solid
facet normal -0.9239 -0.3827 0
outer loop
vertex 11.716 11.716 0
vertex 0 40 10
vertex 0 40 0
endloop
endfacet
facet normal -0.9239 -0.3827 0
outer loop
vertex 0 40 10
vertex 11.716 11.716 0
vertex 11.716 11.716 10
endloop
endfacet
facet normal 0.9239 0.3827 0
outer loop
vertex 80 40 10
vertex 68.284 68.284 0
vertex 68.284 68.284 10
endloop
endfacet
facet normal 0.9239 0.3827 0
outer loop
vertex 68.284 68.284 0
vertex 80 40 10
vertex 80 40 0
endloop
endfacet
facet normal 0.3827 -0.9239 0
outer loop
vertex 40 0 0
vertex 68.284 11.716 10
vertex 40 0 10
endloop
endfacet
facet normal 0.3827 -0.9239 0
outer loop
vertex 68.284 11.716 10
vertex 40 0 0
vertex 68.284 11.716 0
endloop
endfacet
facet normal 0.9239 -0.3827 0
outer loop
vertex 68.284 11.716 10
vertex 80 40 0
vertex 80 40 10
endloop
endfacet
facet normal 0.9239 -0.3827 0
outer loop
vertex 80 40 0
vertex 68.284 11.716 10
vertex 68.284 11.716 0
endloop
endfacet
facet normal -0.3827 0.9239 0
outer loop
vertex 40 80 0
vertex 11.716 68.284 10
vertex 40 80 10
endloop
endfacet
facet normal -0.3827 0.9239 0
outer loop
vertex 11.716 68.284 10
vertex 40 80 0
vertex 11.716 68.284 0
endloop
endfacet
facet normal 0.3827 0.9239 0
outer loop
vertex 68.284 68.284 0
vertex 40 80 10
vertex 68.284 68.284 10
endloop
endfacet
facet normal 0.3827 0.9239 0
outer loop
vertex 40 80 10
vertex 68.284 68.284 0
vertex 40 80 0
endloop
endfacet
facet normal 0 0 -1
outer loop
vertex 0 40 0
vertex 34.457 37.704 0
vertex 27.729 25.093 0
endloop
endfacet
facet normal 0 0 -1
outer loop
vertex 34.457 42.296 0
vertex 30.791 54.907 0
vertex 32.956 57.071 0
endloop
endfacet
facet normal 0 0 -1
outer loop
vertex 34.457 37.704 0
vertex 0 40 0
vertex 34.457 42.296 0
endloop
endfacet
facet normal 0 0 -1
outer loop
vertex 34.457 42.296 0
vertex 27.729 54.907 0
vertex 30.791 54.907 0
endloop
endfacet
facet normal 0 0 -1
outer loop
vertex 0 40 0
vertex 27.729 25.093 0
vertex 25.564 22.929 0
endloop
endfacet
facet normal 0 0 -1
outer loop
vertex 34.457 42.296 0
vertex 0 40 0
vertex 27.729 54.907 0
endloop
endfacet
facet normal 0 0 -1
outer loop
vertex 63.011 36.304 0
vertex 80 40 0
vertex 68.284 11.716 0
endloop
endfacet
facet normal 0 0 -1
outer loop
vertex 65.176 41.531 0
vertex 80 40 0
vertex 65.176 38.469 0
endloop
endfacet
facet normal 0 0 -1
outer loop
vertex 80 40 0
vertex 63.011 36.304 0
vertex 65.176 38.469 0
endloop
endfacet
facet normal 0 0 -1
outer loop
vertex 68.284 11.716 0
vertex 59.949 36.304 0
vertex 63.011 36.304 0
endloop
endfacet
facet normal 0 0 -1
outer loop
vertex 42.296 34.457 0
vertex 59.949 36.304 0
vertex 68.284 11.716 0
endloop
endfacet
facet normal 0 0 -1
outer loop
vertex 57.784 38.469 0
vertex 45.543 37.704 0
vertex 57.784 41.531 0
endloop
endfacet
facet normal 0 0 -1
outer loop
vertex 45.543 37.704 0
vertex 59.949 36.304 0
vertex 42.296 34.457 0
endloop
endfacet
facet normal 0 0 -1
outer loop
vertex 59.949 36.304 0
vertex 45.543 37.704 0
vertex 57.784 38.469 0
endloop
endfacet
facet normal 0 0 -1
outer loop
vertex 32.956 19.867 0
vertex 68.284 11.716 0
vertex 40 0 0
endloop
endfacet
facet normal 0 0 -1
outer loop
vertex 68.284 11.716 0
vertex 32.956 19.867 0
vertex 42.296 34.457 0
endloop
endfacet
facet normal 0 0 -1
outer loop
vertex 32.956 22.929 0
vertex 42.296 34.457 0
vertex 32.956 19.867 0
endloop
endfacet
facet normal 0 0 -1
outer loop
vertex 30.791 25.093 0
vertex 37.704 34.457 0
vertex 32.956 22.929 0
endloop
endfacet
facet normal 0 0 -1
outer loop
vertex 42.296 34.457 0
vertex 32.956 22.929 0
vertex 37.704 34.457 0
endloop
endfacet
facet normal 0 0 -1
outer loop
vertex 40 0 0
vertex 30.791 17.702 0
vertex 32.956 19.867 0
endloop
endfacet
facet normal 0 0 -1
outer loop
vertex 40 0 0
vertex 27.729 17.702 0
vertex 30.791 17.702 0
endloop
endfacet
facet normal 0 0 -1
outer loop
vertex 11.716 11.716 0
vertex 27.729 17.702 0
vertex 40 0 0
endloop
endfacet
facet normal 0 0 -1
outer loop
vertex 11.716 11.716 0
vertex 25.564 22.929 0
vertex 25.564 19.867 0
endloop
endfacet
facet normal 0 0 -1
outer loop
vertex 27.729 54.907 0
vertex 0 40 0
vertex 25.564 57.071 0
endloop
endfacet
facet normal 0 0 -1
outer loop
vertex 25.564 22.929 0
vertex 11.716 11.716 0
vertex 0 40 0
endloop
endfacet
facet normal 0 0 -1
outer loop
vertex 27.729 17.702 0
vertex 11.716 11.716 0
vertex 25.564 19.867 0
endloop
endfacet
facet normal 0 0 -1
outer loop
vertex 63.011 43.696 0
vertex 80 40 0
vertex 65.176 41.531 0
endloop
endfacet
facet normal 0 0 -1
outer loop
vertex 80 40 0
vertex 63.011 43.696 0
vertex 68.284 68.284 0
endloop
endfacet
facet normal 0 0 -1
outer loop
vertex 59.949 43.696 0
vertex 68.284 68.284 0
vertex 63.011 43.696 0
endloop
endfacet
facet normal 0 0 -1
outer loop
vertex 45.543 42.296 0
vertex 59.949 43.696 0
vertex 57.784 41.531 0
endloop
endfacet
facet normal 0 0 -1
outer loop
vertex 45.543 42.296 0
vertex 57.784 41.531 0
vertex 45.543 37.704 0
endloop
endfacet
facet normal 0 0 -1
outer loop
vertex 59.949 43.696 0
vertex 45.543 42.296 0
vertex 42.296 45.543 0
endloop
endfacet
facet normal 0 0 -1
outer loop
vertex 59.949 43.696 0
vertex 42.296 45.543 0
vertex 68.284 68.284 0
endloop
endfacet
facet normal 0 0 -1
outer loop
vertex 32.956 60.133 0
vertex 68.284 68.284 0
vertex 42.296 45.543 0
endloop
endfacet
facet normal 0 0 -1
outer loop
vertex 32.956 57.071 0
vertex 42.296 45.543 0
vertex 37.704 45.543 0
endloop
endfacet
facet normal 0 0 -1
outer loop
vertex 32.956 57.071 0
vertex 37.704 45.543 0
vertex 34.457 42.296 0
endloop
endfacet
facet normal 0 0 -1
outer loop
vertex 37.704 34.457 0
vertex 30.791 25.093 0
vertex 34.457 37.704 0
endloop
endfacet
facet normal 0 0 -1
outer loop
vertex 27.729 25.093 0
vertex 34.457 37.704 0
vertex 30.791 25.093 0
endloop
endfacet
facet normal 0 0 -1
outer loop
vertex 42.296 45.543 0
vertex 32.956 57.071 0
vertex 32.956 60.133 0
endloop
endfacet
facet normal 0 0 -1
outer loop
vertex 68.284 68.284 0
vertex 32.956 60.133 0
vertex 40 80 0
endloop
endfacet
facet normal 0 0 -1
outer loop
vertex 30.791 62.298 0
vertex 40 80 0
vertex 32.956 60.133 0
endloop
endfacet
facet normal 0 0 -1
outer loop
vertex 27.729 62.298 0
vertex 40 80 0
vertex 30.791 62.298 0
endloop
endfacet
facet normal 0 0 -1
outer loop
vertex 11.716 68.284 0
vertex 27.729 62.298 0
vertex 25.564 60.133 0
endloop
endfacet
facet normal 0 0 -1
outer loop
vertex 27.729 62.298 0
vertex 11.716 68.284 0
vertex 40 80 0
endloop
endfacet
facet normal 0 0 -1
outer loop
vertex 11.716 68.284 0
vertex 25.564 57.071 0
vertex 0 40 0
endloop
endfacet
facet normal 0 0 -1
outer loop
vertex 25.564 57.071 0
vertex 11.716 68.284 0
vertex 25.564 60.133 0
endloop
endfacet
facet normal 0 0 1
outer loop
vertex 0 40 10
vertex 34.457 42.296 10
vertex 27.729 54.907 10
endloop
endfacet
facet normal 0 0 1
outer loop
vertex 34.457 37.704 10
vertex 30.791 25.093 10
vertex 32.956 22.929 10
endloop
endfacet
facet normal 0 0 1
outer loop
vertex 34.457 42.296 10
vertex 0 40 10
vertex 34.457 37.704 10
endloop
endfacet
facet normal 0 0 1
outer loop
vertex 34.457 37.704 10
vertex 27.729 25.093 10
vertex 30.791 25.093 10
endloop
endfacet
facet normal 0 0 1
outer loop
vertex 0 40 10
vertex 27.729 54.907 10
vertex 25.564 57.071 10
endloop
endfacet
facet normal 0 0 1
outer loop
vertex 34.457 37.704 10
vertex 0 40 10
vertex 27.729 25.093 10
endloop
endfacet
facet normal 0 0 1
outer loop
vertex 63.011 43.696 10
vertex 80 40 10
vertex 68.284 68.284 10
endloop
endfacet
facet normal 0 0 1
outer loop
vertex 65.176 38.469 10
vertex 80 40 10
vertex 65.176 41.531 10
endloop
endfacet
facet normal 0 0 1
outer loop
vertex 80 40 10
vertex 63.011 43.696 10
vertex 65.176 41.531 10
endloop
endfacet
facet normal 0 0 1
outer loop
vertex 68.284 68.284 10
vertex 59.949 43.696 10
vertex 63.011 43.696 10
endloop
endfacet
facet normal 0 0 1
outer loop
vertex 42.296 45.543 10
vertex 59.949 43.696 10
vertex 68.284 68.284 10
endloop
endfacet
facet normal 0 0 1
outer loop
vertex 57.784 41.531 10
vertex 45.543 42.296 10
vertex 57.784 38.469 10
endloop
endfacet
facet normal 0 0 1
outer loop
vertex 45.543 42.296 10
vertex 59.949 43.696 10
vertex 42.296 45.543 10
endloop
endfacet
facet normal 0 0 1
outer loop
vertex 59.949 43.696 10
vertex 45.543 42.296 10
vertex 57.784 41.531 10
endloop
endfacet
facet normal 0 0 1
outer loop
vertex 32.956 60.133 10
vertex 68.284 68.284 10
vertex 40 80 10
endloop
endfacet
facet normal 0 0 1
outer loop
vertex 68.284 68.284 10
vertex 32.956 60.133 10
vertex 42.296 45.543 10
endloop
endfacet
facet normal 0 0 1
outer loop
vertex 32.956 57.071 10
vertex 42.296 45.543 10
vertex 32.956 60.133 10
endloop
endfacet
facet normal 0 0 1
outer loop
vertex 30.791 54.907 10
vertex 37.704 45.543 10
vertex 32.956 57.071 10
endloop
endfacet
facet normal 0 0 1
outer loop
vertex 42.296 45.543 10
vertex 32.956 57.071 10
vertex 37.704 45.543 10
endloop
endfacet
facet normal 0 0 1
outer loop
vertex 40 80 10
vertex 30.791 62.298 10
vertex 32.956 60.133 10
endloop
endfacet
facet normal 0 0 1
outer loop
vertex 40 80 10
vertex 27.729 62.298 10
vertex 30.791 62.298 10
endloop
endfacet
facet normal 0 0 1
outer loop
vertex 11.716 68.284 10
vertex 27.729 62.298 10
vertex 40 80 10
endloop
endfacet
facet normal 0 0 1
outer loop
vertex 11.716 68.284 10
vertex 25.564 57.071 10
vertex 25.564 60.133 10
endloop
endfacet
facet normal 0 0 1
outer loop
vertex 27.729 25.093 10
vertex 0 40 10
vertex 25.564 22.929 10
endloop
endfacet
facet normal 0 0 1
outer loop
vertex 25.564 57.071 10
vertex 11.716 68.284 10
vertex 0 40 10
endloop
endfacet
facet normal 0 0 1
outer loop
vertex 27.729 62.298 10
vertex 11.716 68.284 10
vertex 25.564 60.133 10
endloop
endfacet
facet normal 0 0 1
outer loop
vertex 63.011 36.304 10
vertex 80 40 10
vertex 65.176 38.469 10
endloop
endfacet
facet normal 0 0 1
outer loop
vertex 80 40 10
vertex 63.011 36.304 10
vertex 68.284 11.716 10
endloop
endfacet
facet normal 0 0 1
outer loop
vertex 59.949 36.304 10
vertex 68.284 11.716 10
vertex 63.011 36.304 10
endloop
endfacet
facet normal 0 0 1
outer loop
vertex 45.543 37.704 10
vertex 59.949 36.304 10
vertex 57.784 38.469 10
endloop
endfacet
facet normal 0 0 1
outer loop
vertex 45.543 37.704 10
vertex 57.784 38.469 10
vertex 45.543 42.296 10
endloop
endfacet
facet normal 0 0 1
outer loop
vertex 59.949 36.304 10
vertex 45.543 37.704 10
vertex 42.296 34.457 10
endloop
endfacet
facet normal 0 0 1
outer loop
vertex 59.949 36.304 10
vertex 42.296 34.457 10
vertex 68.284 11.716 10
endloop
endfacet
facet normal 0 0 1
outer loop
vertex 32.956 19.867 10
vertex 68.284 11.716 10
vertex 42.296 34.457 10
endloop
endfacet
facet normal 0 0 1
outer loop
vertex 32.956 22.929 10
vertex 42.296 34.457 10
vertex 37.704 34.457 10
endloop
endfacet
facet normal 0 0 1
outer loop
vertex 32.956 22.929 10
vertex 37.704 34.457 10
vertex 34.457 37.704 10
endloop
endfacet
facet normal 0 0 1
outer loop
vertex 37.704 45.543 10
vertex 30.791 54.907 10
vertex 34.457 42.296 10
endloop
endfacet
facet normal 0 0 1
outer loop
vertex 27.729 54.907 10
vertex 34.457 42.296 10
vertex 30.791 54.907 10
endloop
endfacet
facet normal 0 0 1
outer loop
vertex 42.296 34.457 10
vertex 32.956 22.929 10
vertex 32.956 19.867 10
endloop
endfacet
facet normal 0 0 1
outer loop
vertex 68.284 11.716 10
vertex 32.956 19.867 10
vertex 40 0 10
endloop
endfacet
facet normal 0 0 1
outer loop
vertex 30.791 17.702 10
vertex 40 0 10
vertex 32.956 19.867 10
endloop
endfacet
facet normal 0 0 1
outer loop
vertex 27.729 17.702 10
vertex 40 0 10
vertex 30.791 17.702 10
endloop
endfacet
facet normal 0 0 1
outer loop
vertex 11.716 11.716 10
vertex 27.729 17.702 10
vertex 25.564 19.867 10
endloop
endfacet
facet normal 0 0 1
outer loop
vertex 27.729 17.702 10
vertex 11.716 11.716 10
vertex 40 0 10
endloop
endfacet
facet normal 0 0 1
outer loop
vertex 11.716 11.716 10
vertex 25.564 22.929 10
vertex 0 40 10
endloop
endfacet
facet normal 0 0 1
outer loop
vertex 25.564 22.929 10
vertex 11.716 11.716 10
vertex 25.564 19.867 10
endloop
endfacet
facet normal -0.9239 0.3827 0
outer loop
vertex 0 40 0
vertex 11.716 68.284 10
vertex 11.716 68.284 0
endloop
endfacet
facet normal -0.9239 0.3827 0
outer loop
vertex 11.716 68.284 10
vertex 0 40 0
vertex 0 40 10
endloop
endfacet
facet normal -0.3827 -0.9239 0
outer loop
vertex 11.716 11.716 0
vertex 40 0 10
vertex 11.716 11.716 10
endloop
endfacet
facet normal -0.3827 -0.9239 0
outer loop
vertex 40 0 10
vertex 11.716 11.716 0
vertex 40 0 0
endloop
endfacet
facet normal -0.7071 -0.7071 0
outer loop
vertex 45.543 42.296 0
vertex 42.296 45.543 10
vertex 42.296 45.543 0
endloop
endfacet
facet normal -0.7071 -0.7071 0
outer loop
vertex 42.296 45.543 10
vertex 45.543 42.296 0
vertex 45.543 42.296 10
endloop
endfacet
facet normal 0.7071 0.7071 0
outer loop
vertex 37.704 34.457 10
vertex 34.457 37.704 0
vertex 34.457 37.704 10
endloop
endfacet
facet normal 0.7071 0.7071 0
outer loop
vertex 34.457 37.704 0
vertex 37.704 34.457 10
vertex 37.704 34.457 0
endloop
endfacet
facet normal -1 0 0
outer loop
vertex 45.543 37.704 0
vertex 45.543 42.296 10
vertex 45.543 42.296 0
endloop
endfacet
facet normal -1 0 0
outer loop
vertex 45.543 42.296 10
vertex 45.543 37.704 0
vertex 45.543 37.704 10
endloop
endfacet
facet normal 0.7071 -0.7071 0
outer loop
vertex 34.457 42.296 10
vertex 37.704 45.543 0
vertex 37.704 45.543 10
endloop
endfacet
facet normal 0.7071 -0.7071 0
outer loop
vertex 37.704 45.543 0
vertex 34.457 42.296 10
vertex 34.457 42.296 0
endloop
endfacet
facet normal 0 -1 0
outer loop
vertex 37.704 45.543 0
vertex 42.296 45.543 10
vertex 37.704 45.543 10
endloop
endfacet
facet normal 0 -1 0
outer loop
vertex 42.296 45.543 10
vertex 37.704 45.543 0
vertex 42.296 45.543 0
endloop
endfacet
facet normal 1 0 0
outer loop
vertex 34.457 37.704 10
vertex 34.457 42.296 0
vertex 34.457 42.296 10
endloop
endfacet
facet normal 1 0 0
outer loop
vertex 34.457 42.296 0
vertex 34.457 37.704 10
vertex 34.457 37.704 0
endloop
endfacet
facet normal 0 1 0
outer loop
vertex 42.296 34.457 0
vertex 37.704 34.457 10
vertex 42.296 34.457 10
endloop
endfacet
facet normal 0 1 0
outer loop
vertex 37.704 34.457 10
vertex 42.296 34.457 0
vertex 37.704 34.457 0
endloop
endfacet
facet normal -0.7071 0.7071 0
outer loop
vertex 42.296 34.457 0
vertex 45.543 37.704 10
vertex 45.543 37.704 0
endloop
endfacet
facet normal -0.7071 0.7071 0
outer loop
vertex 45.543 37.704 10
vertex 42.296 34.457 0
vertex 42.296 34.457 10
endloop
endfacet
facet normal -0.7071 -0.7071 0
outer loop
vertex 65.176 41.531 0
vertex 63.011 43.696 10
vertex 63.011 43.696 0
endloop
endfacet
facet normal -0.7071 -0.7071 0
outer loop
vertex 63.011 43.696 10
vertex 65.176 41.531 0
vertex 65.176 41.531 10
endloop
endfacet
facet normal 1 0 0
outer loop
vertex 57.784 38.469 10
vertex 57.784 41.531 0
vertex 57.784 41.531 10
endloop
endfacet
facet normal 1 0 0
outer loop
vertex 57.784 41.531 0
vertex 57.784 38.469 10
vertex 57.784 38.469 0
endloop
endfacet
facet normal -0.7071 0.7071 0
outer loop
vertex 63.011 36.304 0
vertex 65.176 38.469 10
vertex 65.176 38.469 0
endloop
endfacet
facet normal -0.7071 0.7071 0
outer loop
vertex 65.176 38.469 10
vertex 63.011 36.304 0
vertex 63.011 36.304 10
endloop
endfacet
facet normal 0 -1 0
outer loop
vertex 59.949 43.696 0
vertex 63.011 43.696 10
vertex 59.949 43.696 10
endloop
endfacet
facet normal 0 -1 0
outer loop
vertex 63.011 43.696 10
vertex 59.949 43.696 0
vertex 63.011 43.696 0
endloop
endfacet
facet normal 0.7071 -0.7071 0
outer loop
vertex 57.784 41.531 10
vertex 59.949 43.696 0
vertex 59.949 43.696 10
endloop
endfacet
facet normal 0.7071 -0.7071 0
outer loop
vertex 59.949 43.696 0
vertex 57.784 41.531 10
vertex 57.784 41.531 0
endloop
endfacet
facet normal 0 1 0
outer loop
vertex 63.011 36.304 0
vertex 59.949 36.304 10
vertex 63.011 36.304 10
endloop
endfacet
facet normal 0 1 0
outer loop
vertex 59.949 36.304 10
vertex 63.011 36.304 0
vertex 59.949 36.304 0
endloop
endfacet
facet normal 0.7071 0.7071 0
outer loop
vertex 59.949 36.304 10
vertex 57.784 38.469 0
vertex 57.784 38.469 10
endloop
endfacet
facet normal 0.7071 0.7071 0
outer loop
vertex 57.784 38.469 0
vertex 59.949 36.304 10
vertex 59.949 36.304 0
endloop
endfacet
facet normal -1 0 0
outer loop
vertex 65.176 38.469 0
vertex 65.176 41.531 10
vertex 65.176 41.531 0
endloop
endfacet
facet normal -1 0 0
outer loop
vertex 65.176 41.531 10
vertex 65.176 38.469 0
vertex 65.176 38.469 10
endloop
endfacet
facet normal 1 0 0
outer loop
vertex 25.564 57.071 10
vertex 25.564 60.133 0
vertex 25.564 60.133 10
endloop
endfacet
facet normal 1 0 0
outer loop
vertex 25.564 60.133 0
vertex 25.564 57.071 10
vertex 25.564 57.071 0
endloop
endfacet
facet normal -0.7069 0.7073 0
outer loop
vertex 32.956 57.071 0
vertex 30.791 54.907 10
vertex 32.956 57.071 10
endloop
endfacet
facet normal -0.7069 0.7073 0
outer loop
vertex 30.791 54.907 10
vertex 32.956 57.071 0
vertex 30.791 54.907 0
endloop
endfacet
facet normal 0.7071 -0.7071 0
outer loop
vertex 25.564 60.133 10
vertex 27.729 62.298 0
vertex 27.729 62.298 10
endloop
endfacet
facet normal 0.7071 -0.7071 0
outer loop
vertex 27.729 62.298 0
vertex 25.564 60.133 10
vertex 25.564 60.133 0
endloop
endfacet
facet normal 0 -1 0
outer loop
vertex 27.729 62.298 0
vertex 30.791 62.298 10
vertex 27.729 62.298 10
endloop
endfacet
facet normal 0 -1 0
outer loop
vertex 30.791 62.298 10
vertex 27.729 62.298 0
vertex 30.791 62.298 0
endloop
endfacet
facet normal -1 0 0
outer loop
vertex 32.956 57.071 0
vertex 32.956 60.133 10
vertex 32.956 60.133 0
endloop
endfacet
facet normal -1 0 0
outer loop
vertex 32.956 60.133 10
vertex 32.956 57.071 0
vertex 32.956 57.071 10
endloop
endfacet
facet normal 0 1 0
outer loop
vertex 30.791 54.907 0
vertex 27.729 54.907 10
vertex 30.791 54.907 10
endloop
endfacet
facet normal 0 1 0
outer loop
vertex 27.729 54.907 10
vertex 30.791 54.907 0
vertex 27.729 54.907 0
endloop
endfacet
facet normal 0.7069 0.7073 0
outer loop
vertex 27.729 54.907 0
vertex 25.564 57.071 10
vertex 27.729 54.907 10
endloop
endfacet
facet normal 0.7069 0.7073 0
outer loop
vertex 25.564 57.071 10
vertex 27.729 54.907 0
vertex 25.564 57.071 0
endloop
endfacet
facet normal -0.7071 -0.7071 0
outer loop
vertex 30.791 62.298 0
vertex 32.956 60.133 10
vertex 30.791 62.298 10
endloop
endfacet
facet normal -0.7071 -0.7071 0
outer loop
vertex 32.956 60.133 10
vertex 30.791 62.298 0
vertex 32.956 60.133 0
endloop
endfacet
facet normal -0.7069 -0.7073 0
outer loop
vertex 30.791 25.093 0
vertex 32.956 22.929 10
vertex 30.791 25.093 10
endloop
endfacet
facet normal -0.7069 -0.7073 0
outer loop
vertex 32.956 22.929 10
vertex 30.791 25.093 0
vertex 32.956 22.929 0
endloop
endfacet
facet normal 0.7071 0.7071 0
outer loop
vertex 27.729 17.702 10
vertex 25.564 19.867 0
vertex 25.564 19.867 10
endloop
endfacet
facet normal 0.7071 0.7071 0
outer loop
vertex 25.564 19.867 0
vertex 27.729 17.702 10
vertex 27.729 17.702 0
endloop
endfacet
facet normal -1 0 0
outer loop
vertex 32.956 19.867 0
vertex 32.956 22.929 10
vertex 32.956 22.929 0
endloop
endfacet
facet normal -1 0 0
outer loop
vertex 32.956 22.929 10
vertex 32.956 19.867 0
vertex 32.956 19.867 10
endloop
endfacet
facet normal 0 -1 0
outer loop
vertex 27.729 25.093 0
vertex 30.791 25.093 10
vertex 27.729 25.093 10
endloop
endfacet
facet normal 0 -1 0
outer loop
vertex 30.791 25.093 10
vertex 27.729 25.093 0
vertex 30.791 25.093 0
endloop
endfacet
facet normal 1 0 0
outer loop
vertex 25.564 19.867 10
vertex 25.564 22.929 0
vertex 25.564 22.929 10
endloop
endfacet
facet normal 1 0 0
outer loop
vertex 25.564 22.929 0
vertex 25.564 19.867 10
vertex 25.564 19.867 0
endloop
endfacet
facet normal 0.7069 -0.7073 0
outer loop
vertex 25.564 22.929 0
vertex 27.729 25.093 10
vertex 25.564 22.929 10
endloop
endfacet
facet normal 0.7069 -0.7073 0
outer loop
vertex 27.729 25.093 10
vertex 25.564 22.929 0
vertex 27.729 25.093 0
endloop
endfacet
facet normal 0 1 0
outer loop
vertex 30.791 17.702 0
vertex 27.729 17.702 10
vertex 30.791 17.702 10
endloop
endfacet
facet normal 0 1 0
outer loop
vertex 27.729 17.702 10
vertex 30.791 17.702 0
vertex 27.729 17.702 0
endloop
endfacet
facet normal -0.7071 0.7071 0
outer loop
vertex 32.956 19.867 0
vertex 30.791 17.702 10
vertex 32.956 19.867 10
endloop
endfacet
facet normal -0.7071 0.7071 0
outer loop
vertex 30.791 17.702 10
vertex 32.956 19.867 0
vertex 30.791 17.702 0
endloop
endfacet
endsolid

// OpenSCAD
$fn = 32;

// ----------------------------------------------------------------------
// Polygon plate: 8-gon R40, 3 bolt windows
// ----------------------------------------------------------------------

// --- parameters (mm) ---
sides = 8;                // number of polygon sides
plate_r = 40;             // circumscribed radius of the polygon
bore_r = 6;               // centre bore radius
bolts = 3;                // number of bolt windows
ring_r = 21.48;           // bolt-circle radius
bolt_r = 4;               // bolt window radius
plate_t = 10;             // plate thickness, Z (extrusion height)

plate_d = 2 * plate_r;  // circumscribed diameter
bore_d = 2 * bore_r;  // centre bore diameter
bolt_d = 2 * bolt_r;  // bolt window diameter
ring_d = 2 * ring_r;  // bolt-circle diameter

profile = [[80, 40], [68.284, 68.284], [40, 80], [11.716, 68.284], [0, 40], [11.716, 11.716], [40, 0], [68.284, 11.716]];  // primary outline, 8 points, counter clockwise
void_1 = [[45.543, 42.296], [42.296, 45.543], [37.704, 45.543], [34.457, 42.296], [34.457, 37.704], [37.704, 34.457], [42.296, 34.457], [45.543, 37.704]];  // centre bore, 8 points
void_2 = [[65.176, 41.531], [63.011, 43.696], [59.949, 43.696], [57.784, 41.531], [57.784, 38.469], [59.949, 36.304], [63.011, 36.304], [65.176, 38.469]];  // bolt window 1, 8 points
void_3 = [[32.956, 60.133], [30.791, 62.298], [27.729, 62.298], [25.564, 60.133], [25.564, 57.071], [27.729, 54.907], [30.791, 54.907], [32.956, 57.071]];  // bolt window 2, 8 points
void_4 = [[32.956, 22.929], [30.791, 25.093], [27.729, 25.093], [25.564, 22.929], [25.564, 19.867], [27.729, 17.702], [30.791, 17.702], [32.956, 19.867]];  // bolt window 3, 8 points

// --- the one profile operation ---
difference() {
  linear_extrude(height = plate_t) polygon(points = profile);
  translate([0, 0, -1])
    linear_extrude(height = plate_t + 2) polygon(points = void_1);
  translate([0, 0, -1])
    linear_extrude(height = plate_t + 2) polygon(points = void_2);
  translate([0, 0, -1])
    linear_extrude(height = plate_t + 2) polygon(points = void_3);
  translate([0, 0, -1])
    linear_extrude(height = plate_t + 2) polygon(points = void_4);
}
